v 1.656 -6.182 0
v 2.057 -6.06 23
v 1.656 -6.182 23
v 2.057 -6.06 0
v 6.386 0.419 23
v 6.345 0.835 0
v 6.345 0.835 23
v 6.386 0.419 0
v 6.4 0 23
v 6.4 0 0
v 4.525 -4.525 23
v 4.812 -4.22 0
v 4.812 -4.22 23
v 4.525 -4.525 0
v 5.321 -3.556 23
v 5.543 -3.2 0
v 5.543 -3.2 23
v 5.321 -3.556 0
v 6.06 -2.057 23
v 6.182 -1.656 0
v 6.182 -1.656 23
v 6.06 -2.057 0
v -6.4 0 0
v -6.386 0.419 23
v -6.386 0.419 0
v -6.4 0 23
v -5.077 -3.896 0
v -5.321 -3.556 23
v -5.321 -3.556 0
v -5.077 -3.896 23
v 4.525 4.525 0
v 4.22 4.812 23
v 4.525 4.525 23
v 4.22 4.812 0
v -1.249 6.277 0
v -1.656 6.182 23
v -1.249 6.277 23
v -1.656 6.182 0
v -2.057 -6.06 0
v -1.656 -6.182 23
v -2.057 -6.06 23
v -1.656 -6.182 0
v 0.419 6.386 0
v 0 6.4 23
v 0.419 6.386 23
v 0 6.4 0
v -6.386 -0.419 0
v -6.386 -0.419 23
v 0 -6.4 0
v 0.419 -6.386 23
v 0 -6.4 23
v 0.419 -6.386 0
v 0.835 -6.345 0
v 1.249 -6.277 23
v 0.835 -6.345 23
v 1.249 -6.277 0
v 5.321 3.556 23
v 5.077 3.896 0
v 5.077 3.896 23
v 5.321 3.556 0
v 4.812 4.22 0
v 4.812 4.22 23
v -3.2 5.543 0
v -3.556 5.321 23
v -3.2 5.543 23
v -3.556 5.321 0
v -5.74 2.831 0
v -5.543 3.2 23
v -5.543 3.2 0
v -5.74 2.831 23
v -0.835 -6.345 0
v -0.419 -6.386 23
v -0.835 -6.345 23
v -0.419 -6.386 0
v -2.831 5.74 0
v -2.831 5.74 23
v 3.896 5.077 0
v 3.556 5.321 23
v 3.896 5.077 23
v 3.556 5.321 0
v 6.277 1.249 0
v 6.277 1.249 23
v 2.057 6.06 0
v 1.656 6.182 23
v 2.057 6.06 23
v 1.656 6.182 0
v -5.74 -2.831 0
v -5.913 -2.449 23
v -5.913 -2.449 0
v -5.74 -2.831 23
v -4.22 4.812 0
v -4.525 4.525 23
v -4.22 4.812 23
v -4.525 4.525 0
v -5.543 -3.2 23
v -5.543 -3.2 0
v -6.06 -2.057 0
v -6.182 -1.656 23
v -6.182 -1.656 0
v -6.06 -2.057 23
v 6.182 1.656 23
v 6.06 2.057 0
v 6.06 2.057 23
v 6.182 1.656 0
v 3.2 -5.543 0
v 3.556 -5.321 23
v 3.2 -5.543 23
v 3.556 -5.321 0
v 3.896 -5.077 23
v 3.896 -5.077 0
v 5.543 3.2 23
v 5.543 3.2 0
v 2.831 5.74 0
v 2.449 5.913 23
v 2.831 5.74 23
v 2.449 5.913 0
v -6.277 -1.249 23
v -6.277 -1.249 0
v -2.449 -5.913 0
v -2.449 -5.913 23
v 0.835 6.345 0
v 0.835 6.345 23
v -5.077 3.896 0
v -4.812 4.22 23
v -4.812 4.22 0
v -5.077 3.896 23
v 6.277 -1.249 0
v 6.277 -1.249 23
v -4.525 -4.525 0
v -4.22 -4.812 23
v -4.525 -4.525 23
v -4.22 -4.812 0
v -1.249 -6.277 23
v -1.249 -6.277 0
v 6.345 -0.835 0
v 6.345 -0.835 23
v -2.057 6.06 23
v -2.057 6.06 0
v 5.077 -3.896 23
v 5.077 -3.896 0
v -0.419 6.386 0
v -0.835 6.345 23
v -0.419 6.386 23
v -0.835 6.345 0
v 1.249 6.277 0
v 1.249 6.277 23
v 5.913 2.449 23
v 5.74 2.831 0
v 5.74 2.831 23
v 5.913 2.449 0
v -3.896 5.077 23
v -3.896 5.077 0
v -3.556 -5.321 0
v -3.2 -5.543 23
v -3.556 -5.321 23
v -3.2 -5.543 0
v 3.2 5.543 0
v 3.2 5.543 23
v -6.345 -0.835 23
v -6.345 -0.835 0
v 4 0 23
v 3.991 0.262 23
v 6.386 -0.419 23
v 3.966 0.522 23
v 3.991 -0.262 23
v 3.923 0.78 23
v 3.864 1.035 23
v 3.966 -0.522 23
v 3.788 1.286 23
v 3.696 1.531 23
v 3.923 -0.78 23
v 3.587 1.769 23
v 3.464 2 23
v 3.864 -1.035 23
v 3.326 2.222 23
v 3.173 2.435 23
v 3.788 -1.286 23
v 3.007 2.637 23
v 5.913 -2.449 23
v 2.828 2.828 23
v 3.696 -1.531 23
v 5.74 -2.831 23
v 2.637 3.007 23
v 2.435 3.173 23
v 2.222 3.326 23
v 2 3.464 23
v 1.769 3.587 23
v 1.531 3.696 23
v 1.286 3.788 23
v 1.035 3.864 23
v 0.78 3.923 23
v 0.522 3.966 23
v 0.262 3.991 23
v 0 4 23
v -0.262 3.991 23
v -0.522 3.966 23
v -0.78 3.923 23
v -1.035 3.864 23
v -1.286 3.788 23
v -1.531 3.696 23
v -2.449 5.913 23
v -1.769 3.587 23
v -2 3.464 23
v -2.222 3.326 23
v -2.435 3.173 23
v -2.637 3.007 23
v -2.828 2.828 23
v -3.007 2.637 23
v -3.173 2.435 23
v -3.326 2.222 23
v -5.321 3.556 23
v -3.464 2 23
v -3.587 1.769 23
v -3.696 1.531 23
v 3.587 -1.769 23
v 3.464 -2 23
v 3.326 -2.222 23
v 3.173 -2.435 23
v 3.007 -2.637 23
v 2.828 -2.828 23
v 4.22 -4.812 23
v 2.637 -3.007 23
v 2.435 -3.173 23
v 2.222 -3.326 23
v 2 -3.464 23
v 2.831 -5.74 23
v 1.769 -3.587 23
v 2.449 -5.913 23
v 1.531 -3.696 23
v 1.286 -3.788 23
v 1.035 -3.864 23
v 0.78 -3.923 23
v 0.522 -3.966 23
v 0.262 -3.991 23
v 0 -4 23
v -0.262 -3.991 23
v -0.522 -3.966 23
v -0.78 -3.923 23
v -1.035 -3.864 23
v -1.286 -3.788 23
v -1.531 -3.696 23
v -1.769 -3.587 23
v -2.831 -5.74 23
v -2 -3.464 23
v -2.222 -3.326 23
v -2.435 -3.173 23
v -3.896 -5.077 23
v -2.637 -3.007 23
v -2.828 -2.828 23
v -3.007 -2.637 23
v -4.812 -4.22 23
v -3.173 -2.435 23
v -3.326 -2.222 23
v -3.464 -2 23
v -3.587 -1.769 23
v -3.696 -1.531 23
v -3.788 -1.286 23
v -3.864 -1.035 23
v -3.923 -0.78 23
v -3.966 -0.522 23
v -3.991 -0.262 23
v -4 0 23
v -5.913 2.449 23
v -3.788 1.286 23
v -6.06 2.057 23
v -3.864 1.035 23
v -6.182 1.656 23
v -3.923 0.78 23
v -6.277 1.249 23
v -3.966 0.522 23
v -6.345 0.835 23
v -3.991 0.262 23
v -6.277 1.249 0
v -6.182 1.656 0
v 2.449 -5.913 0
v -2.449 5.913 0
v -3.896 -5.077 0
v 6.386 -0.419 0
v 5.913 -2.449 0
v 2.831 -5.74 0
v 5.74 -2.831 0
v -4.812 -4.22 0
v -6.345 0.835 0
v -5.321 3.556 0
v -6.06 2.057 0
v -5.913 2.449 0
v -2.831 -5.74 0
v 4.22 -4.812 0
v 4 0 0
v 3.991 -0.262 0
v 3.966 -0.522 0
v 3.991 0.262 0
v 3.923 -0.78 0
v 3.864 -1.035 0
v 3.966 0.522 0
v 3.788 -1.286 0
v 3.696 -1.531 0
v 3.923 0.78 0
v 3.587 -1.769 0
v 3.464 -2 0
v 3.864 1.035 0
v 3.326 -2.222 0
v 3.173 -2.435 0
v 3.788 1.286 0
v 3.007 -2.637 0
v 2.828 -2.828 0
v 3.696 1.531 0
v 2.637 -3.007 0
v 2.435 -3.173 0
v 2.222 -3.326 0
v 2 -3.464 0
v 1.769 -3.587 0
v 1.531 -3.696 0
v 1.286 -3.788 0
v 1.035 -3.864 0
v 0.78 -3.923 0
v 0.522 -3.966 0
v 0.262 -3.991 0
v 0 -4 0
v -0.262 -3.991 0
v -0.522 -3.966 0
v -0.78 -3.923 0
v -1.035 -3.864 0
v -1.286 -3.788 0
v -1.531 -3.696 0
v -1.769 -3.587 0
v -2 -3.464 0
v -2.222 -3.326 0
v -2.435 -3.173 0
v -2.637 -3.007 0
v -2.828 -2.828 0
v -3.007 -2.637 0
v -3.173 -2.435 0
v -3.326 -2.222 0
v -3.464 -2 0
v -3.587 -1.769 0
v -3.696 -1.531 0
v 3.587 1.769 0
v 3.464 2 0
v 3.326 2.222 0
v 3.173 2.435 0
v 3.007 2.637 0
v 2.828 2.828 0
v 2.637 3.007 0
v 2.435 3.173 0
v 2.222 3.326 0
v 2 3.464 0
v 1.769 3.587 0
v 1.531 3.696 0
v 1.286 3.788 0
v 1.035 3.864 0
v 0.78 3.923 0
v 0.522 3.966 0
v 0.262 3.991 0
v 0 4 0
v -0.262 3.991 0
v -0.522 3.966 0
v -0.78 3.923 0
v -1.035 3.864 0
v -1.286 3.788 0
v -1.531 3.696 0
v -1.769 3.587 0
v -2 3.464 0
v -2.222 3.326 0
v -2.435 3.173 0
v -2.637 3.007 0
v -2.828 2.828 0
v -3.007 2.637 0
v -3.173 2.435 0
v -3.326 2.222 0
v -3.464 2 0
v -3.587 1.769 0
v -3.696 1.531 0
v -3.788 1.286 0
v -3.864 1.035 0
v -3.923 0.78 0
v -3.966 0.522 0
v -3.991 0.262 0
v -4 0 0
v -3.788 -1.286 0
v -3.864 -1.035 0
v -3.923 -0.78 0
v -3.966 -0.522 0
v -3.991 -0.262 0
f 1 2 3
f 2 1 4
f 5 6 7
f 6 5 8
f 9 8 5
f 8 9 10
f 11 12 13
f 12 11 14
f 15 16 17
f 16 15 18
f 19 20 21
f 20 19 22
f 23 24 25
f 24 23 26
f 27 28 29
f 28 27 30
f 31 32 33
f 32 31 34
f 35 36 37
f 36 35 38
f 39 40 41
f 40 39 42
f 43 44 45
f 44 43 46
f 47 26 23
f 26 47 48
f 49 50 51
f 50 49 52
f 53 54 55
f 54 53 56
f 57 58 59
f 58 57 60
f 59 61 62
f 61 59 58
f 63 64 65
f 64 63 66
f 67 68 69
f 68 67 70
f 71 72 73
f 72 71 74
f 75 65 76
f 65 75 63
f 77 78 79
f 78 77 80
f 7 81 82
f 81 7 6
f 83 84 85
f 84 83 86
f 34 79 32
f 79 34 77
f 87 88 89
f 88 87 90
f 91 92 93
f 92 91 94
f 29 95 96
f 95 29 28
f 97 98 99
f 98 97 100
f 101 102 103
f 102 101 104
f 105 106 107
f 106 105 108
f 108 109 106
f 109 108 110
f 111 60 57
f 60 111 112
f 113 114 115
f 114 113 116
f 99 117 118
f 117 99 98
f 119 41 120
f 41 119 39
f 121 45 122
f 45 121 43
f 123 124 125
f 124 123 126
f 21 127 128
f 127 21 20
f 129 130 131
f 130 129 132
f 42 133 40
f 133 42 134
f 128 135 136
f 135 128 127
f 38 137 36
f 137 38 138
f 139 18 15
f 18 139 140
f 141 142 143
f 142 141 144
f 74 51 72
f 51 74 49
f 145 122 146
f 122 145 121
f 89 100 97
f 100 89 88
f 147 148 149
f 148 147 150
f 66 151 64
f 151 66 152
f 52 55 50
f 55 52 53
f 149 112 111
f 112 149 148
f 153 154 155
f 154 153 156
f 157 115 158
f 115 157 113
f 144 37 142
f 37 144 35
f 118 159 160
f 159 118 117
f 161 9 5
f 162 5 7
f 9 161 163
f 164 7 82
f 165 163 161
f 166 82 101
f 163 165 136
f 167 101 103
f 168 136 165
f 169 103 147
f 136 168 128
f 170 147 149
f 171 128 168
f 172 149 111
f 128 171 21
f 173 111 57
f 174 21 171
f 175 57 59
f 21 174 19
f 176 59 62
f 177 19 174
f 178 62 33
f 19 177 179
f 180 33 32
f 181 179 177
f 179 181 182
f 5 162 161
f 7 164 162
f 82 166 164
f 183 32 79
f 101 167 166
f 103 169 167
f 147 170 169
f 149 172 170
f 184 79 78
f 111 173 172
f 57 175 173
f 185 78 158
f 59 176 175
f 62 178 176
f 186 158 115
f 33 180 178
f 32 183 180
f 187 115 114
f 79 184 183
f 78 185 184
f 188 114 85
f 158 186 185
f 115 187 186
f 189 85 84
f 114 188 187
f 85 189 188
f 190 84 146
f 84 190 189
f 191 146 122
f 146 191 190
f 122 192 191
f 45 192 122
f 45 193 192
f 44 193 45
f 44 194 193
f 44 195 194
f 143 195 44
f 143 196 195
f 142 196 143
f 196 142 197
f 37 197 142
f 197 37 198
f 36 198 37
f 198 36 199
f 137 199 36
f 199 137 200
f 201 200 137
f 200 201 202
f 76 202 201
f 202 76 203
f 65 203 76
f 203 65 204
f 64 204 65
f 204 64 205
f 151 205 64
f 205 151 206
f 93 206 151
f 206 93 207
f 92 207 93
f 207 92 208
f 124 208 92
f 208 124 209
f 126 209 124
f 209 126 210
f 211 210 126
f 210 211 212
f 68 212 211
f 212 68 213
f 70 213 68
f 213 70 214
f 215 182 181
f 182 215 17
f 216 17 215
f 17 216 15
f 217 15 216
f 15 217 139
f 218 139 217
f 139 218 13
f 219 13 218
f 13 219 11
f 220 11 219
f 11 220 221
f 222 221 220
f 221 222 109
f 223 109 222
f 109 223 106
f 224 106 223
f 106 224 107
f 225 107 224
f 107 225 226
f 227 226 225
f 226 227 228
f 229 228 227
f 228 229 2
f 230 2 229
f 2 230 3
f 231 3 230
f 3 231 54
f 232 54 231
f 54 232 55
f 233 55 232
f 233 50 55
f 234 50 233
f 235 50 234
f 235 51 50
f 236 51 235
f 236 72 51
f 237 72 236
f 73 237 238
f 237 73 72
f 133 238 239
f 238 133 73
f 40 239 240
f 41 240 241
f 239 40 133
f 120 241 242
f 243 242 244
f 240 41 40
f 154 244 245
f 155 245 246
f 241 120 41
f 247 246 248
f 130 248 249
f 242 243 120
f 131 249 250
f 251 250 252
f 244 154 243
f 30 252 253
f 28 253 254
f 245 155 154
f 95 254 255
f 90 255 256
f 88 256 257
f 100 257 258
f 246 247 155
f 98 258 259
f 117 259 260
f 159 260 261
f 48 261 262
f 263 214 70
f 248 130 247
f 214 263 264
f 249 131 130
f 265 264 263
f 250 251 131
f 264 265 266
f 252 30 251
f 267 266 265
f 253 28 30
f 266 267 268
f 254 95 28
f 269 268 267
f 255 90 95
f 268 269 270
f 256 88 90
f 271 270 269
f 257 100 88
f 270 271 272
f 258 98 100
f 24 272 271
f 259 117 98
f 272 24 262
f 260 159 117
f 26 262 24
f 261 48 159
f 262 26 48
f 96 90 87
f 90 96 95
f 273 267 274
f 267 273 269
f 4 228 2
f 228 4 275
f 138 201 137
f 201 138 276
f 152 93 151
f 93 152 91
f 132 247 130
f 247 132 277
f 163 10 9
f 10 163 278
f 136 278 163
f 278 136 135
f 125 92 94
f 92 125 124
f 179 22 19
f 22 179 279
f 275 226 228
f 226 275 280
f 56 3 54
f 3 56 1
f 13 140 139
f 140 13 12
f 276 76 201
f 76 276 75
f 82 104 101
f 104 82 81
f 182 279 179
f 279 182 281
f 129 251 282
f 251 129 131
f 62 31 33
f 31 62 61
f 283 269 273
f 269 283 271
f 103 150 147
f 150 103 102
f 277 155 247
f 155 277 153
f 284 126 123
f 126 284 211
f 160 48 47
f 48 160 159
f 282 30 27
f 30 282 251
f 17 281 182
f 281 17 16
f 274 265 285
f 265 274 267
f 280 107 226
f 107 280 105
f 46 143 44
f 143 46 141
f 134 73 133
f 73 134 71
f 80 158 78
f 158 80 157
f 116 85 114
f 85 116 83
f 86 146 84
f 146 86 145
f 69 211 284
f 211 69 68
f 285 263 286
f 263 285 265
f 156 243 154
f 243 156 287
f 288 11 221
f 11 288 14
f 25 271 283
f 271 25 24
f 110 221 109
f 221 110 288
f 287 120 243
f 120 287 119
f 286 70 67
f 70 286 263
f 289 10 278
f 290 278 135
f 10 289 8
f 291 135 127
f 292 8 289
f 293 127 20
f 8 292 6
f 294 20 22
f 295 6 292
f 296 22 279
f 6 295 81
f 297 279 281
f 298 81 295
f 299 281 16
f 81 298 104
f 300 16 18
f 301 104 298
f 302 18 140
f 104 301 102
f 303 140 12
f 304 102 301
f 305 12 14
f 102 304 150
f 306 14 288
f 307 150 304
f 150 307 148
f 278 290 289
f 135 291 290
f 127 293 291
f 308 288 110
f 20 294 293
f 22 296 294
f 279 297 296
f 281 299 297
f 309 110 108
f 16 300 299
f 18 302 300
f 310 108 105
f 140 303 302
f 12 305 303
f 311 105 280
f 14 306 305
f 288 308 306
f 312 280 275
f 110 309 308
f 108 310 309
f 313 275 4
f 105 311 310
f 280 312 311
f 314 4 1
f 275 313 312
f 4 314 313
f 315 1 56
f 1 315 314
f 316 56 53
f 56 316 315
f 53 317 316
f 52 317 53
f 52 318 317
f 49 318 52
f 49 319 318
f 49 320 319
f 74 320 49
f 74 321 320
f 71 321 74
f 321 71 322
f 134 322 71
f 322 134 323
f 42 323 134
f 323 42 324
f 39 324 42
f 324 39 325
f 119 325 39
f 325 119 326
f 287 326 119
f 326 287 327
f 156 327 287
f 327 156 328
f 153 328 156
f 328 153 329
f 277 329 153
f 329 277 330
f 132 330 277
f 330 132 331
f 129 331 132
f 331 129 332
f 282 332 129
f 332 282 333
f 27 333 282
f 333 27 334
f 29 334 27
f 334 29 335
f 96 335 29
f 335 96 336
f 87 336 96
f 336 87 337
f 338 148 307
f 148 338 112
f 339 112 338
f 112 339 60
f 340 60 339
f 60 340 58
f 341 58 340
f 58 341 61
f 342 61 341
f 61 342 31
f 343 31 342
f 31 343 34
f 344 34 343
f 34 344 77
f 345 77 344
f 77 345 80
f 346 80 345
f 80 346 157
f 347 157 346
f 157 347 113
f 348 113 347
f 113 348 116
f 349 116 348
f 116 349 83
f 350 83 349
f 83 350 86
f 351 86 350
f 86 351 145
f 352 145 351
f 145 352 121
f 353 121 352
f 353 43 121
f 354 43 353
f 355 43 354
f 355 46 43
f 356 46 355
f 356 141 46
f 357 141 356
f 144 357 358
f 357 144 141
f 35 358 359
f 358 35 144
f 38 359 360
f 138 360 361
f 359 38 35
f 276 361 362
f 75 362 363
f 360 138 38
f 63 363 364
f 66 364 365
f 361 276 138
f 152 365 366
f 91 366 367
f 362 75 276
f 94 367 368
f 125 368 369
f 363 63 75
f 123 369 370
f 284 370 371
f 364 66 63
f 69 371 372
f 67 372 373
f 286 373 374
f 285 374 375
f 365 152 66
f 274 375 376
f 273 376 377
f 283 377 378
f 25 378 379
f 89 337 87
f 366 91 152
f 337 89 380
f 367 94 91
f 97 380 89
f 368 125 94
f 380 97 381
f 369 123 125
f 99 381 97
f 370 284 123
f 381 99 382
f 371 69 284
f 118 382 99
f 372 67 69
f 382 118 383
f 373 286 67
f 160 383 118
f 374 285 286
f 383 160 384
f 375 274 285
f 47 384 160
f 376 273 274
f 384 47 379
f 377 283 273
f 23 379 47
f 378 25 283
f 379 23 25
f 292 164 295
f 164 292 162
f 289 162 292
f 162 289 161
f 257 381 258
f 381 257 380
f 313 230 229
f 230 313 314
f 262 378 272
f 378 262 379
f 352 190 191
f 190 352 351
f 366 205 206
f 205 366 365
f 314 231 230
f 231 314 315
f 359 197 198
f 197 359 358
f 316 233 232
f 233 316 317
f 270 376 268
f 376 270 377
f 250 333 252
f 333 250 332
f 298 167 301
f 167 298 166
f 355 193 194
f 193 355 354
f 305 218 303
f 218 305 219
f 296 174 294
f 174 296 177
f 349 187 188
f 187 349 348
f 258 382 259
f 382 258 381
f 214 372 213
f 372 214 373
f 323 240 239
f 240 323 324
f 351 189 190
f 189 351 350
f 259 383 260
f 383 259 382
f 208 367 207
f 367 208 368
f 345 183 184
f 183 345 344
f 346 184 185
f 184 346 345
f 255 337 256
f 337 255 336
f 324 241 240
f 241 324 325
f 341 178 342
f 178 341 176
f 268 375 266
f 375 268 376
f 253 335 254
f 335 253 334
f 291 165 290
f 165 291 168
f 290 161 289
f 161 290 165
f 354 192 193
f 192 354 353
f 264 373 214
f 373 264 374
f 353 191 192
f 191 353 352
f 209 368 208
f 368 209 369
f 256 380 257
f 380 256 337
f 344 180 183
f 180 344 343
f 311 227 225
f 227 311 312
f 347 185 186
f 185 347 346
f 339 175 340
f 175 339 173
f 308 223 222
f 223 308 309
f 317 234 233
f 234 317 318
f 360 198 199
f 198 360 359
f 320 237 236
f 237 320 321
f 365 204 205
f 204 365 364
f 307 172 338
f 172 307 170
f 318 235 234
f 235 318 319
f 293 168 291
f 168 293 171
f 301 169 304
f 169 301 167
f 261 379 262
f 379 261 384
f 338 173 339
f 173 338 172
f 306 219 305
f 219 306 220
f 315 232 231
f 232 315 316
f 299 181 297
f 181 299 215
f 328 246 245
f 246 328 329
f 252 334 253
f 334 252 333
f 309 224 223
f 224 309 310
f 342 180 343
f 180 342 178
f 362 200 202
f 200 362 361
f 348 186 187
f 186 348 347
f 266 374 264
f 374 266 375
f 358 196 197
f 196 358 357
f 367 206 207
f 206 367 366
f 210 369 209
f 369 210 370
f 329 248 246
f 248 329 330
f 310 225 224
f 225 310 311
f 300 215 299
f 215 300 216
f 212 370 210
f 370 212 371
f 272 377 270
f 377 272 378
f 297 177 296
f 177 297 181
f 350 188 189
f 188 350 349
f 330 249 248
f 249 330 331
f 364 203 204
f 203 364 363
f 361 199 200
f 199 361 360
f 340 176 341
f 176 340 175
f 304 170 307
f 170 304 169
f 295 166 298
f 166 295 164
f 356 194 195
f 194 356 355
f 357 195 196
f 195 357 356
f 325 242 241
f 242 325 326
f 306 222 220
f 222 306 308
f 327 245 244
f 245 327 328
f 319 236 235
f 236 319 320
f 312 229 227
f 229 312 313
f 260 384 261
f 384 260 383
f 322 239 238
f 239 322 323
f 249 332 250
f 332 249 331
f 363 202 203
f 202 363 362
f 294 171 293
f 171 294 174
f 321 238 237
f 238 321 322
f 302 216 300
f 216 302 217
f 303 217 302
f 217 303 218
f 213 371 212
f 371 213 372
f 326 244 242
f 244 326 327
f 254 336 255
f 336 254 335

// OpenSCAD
// ir_receiver_shroud.scad — field-of-view sleeve for the Jupiter dock IR receivers
// (VS1838B-class 38kHz TSOP on the "IR Receiver" breakout, vertical 3-leg mount).
//
// PURPOSE: clip the TSOP's ~+/-45deg acceptance down to a narrow forward cone so it
// sees the DIRECT dock beam and rejects reflected IR (the bench-flood problem).
//
// PRINT NOTES (both matter — learned the hard way):
//   * BLACK PLA/PETG, >=3 perimeters / wall >= 2mm so it is IR-OPAQUE. Foam-test a
//     scrap against the beacon before trusting it — thin walls leak 940nm.
//   * Keep the BORE MATTE — do NOT sand/smooth it. A shiny bore light-pipes off-axis
//     rays onto the sensor and defeats the whole shroud.
//
// This is the BARREL (universal). The mount to your exact board/bracket needs 3
// measurements — see NOTES at the bottom; give them to me and I'll add the mount.

/* ================= MEASURE THESE ================= */
dome_dia    = 6.0;   // widest part of the TSOP dome/package to clear (mm)
clearance   = 1.0;   // radial air gap around the dome (mm)
protrusion  = 18;    // barrel length PAST the dome front  <-- this sets the cone angle
back_len    = 5;     // barrel length BEHIND the dome front (surrounds the package)
wall        = 2.4;   // wall thickness (>= 2mm for opacity + stiffness)

/* ================= FOV READOUT ================= */
bore_dia = dome_dia + 2*clearance;
echo(str(">>> bore = ", bore_dia, " mm   approx FOV half-angle = ",
         atan((bore_dia/2)/protrusion), " deg   (shorter protrusion = wider)"));

$fn = 96;

// --- the barrel ---
difference() {
    cylinder(d = bore_dia + 2*wall, h = back_len + protrusion);
    translate([0,0,-0.5]) cylinder(d = bore_dia, h = back_len + protrusion + 1);
}

// ================= MOUNTING (needs your numbers) =================
// Pick one; send me the measurements and I'll add it to this file:
//   1) SCREW FLANGE  — module's 2 mounting-hole centre-to-centre spacing, and the
//                      offset from the TSOP centre to that hole line.
//   2) PCB SKIRT     — barrel drops to the PCB and grips around the TSOP legs for
//                      self-support: need the dome standoff height above the board.
//   3) BRACKET-BUILT — fold the barrel into your existing grey receiver mount
//                      (share that STL/measurements and I'll merge it).
